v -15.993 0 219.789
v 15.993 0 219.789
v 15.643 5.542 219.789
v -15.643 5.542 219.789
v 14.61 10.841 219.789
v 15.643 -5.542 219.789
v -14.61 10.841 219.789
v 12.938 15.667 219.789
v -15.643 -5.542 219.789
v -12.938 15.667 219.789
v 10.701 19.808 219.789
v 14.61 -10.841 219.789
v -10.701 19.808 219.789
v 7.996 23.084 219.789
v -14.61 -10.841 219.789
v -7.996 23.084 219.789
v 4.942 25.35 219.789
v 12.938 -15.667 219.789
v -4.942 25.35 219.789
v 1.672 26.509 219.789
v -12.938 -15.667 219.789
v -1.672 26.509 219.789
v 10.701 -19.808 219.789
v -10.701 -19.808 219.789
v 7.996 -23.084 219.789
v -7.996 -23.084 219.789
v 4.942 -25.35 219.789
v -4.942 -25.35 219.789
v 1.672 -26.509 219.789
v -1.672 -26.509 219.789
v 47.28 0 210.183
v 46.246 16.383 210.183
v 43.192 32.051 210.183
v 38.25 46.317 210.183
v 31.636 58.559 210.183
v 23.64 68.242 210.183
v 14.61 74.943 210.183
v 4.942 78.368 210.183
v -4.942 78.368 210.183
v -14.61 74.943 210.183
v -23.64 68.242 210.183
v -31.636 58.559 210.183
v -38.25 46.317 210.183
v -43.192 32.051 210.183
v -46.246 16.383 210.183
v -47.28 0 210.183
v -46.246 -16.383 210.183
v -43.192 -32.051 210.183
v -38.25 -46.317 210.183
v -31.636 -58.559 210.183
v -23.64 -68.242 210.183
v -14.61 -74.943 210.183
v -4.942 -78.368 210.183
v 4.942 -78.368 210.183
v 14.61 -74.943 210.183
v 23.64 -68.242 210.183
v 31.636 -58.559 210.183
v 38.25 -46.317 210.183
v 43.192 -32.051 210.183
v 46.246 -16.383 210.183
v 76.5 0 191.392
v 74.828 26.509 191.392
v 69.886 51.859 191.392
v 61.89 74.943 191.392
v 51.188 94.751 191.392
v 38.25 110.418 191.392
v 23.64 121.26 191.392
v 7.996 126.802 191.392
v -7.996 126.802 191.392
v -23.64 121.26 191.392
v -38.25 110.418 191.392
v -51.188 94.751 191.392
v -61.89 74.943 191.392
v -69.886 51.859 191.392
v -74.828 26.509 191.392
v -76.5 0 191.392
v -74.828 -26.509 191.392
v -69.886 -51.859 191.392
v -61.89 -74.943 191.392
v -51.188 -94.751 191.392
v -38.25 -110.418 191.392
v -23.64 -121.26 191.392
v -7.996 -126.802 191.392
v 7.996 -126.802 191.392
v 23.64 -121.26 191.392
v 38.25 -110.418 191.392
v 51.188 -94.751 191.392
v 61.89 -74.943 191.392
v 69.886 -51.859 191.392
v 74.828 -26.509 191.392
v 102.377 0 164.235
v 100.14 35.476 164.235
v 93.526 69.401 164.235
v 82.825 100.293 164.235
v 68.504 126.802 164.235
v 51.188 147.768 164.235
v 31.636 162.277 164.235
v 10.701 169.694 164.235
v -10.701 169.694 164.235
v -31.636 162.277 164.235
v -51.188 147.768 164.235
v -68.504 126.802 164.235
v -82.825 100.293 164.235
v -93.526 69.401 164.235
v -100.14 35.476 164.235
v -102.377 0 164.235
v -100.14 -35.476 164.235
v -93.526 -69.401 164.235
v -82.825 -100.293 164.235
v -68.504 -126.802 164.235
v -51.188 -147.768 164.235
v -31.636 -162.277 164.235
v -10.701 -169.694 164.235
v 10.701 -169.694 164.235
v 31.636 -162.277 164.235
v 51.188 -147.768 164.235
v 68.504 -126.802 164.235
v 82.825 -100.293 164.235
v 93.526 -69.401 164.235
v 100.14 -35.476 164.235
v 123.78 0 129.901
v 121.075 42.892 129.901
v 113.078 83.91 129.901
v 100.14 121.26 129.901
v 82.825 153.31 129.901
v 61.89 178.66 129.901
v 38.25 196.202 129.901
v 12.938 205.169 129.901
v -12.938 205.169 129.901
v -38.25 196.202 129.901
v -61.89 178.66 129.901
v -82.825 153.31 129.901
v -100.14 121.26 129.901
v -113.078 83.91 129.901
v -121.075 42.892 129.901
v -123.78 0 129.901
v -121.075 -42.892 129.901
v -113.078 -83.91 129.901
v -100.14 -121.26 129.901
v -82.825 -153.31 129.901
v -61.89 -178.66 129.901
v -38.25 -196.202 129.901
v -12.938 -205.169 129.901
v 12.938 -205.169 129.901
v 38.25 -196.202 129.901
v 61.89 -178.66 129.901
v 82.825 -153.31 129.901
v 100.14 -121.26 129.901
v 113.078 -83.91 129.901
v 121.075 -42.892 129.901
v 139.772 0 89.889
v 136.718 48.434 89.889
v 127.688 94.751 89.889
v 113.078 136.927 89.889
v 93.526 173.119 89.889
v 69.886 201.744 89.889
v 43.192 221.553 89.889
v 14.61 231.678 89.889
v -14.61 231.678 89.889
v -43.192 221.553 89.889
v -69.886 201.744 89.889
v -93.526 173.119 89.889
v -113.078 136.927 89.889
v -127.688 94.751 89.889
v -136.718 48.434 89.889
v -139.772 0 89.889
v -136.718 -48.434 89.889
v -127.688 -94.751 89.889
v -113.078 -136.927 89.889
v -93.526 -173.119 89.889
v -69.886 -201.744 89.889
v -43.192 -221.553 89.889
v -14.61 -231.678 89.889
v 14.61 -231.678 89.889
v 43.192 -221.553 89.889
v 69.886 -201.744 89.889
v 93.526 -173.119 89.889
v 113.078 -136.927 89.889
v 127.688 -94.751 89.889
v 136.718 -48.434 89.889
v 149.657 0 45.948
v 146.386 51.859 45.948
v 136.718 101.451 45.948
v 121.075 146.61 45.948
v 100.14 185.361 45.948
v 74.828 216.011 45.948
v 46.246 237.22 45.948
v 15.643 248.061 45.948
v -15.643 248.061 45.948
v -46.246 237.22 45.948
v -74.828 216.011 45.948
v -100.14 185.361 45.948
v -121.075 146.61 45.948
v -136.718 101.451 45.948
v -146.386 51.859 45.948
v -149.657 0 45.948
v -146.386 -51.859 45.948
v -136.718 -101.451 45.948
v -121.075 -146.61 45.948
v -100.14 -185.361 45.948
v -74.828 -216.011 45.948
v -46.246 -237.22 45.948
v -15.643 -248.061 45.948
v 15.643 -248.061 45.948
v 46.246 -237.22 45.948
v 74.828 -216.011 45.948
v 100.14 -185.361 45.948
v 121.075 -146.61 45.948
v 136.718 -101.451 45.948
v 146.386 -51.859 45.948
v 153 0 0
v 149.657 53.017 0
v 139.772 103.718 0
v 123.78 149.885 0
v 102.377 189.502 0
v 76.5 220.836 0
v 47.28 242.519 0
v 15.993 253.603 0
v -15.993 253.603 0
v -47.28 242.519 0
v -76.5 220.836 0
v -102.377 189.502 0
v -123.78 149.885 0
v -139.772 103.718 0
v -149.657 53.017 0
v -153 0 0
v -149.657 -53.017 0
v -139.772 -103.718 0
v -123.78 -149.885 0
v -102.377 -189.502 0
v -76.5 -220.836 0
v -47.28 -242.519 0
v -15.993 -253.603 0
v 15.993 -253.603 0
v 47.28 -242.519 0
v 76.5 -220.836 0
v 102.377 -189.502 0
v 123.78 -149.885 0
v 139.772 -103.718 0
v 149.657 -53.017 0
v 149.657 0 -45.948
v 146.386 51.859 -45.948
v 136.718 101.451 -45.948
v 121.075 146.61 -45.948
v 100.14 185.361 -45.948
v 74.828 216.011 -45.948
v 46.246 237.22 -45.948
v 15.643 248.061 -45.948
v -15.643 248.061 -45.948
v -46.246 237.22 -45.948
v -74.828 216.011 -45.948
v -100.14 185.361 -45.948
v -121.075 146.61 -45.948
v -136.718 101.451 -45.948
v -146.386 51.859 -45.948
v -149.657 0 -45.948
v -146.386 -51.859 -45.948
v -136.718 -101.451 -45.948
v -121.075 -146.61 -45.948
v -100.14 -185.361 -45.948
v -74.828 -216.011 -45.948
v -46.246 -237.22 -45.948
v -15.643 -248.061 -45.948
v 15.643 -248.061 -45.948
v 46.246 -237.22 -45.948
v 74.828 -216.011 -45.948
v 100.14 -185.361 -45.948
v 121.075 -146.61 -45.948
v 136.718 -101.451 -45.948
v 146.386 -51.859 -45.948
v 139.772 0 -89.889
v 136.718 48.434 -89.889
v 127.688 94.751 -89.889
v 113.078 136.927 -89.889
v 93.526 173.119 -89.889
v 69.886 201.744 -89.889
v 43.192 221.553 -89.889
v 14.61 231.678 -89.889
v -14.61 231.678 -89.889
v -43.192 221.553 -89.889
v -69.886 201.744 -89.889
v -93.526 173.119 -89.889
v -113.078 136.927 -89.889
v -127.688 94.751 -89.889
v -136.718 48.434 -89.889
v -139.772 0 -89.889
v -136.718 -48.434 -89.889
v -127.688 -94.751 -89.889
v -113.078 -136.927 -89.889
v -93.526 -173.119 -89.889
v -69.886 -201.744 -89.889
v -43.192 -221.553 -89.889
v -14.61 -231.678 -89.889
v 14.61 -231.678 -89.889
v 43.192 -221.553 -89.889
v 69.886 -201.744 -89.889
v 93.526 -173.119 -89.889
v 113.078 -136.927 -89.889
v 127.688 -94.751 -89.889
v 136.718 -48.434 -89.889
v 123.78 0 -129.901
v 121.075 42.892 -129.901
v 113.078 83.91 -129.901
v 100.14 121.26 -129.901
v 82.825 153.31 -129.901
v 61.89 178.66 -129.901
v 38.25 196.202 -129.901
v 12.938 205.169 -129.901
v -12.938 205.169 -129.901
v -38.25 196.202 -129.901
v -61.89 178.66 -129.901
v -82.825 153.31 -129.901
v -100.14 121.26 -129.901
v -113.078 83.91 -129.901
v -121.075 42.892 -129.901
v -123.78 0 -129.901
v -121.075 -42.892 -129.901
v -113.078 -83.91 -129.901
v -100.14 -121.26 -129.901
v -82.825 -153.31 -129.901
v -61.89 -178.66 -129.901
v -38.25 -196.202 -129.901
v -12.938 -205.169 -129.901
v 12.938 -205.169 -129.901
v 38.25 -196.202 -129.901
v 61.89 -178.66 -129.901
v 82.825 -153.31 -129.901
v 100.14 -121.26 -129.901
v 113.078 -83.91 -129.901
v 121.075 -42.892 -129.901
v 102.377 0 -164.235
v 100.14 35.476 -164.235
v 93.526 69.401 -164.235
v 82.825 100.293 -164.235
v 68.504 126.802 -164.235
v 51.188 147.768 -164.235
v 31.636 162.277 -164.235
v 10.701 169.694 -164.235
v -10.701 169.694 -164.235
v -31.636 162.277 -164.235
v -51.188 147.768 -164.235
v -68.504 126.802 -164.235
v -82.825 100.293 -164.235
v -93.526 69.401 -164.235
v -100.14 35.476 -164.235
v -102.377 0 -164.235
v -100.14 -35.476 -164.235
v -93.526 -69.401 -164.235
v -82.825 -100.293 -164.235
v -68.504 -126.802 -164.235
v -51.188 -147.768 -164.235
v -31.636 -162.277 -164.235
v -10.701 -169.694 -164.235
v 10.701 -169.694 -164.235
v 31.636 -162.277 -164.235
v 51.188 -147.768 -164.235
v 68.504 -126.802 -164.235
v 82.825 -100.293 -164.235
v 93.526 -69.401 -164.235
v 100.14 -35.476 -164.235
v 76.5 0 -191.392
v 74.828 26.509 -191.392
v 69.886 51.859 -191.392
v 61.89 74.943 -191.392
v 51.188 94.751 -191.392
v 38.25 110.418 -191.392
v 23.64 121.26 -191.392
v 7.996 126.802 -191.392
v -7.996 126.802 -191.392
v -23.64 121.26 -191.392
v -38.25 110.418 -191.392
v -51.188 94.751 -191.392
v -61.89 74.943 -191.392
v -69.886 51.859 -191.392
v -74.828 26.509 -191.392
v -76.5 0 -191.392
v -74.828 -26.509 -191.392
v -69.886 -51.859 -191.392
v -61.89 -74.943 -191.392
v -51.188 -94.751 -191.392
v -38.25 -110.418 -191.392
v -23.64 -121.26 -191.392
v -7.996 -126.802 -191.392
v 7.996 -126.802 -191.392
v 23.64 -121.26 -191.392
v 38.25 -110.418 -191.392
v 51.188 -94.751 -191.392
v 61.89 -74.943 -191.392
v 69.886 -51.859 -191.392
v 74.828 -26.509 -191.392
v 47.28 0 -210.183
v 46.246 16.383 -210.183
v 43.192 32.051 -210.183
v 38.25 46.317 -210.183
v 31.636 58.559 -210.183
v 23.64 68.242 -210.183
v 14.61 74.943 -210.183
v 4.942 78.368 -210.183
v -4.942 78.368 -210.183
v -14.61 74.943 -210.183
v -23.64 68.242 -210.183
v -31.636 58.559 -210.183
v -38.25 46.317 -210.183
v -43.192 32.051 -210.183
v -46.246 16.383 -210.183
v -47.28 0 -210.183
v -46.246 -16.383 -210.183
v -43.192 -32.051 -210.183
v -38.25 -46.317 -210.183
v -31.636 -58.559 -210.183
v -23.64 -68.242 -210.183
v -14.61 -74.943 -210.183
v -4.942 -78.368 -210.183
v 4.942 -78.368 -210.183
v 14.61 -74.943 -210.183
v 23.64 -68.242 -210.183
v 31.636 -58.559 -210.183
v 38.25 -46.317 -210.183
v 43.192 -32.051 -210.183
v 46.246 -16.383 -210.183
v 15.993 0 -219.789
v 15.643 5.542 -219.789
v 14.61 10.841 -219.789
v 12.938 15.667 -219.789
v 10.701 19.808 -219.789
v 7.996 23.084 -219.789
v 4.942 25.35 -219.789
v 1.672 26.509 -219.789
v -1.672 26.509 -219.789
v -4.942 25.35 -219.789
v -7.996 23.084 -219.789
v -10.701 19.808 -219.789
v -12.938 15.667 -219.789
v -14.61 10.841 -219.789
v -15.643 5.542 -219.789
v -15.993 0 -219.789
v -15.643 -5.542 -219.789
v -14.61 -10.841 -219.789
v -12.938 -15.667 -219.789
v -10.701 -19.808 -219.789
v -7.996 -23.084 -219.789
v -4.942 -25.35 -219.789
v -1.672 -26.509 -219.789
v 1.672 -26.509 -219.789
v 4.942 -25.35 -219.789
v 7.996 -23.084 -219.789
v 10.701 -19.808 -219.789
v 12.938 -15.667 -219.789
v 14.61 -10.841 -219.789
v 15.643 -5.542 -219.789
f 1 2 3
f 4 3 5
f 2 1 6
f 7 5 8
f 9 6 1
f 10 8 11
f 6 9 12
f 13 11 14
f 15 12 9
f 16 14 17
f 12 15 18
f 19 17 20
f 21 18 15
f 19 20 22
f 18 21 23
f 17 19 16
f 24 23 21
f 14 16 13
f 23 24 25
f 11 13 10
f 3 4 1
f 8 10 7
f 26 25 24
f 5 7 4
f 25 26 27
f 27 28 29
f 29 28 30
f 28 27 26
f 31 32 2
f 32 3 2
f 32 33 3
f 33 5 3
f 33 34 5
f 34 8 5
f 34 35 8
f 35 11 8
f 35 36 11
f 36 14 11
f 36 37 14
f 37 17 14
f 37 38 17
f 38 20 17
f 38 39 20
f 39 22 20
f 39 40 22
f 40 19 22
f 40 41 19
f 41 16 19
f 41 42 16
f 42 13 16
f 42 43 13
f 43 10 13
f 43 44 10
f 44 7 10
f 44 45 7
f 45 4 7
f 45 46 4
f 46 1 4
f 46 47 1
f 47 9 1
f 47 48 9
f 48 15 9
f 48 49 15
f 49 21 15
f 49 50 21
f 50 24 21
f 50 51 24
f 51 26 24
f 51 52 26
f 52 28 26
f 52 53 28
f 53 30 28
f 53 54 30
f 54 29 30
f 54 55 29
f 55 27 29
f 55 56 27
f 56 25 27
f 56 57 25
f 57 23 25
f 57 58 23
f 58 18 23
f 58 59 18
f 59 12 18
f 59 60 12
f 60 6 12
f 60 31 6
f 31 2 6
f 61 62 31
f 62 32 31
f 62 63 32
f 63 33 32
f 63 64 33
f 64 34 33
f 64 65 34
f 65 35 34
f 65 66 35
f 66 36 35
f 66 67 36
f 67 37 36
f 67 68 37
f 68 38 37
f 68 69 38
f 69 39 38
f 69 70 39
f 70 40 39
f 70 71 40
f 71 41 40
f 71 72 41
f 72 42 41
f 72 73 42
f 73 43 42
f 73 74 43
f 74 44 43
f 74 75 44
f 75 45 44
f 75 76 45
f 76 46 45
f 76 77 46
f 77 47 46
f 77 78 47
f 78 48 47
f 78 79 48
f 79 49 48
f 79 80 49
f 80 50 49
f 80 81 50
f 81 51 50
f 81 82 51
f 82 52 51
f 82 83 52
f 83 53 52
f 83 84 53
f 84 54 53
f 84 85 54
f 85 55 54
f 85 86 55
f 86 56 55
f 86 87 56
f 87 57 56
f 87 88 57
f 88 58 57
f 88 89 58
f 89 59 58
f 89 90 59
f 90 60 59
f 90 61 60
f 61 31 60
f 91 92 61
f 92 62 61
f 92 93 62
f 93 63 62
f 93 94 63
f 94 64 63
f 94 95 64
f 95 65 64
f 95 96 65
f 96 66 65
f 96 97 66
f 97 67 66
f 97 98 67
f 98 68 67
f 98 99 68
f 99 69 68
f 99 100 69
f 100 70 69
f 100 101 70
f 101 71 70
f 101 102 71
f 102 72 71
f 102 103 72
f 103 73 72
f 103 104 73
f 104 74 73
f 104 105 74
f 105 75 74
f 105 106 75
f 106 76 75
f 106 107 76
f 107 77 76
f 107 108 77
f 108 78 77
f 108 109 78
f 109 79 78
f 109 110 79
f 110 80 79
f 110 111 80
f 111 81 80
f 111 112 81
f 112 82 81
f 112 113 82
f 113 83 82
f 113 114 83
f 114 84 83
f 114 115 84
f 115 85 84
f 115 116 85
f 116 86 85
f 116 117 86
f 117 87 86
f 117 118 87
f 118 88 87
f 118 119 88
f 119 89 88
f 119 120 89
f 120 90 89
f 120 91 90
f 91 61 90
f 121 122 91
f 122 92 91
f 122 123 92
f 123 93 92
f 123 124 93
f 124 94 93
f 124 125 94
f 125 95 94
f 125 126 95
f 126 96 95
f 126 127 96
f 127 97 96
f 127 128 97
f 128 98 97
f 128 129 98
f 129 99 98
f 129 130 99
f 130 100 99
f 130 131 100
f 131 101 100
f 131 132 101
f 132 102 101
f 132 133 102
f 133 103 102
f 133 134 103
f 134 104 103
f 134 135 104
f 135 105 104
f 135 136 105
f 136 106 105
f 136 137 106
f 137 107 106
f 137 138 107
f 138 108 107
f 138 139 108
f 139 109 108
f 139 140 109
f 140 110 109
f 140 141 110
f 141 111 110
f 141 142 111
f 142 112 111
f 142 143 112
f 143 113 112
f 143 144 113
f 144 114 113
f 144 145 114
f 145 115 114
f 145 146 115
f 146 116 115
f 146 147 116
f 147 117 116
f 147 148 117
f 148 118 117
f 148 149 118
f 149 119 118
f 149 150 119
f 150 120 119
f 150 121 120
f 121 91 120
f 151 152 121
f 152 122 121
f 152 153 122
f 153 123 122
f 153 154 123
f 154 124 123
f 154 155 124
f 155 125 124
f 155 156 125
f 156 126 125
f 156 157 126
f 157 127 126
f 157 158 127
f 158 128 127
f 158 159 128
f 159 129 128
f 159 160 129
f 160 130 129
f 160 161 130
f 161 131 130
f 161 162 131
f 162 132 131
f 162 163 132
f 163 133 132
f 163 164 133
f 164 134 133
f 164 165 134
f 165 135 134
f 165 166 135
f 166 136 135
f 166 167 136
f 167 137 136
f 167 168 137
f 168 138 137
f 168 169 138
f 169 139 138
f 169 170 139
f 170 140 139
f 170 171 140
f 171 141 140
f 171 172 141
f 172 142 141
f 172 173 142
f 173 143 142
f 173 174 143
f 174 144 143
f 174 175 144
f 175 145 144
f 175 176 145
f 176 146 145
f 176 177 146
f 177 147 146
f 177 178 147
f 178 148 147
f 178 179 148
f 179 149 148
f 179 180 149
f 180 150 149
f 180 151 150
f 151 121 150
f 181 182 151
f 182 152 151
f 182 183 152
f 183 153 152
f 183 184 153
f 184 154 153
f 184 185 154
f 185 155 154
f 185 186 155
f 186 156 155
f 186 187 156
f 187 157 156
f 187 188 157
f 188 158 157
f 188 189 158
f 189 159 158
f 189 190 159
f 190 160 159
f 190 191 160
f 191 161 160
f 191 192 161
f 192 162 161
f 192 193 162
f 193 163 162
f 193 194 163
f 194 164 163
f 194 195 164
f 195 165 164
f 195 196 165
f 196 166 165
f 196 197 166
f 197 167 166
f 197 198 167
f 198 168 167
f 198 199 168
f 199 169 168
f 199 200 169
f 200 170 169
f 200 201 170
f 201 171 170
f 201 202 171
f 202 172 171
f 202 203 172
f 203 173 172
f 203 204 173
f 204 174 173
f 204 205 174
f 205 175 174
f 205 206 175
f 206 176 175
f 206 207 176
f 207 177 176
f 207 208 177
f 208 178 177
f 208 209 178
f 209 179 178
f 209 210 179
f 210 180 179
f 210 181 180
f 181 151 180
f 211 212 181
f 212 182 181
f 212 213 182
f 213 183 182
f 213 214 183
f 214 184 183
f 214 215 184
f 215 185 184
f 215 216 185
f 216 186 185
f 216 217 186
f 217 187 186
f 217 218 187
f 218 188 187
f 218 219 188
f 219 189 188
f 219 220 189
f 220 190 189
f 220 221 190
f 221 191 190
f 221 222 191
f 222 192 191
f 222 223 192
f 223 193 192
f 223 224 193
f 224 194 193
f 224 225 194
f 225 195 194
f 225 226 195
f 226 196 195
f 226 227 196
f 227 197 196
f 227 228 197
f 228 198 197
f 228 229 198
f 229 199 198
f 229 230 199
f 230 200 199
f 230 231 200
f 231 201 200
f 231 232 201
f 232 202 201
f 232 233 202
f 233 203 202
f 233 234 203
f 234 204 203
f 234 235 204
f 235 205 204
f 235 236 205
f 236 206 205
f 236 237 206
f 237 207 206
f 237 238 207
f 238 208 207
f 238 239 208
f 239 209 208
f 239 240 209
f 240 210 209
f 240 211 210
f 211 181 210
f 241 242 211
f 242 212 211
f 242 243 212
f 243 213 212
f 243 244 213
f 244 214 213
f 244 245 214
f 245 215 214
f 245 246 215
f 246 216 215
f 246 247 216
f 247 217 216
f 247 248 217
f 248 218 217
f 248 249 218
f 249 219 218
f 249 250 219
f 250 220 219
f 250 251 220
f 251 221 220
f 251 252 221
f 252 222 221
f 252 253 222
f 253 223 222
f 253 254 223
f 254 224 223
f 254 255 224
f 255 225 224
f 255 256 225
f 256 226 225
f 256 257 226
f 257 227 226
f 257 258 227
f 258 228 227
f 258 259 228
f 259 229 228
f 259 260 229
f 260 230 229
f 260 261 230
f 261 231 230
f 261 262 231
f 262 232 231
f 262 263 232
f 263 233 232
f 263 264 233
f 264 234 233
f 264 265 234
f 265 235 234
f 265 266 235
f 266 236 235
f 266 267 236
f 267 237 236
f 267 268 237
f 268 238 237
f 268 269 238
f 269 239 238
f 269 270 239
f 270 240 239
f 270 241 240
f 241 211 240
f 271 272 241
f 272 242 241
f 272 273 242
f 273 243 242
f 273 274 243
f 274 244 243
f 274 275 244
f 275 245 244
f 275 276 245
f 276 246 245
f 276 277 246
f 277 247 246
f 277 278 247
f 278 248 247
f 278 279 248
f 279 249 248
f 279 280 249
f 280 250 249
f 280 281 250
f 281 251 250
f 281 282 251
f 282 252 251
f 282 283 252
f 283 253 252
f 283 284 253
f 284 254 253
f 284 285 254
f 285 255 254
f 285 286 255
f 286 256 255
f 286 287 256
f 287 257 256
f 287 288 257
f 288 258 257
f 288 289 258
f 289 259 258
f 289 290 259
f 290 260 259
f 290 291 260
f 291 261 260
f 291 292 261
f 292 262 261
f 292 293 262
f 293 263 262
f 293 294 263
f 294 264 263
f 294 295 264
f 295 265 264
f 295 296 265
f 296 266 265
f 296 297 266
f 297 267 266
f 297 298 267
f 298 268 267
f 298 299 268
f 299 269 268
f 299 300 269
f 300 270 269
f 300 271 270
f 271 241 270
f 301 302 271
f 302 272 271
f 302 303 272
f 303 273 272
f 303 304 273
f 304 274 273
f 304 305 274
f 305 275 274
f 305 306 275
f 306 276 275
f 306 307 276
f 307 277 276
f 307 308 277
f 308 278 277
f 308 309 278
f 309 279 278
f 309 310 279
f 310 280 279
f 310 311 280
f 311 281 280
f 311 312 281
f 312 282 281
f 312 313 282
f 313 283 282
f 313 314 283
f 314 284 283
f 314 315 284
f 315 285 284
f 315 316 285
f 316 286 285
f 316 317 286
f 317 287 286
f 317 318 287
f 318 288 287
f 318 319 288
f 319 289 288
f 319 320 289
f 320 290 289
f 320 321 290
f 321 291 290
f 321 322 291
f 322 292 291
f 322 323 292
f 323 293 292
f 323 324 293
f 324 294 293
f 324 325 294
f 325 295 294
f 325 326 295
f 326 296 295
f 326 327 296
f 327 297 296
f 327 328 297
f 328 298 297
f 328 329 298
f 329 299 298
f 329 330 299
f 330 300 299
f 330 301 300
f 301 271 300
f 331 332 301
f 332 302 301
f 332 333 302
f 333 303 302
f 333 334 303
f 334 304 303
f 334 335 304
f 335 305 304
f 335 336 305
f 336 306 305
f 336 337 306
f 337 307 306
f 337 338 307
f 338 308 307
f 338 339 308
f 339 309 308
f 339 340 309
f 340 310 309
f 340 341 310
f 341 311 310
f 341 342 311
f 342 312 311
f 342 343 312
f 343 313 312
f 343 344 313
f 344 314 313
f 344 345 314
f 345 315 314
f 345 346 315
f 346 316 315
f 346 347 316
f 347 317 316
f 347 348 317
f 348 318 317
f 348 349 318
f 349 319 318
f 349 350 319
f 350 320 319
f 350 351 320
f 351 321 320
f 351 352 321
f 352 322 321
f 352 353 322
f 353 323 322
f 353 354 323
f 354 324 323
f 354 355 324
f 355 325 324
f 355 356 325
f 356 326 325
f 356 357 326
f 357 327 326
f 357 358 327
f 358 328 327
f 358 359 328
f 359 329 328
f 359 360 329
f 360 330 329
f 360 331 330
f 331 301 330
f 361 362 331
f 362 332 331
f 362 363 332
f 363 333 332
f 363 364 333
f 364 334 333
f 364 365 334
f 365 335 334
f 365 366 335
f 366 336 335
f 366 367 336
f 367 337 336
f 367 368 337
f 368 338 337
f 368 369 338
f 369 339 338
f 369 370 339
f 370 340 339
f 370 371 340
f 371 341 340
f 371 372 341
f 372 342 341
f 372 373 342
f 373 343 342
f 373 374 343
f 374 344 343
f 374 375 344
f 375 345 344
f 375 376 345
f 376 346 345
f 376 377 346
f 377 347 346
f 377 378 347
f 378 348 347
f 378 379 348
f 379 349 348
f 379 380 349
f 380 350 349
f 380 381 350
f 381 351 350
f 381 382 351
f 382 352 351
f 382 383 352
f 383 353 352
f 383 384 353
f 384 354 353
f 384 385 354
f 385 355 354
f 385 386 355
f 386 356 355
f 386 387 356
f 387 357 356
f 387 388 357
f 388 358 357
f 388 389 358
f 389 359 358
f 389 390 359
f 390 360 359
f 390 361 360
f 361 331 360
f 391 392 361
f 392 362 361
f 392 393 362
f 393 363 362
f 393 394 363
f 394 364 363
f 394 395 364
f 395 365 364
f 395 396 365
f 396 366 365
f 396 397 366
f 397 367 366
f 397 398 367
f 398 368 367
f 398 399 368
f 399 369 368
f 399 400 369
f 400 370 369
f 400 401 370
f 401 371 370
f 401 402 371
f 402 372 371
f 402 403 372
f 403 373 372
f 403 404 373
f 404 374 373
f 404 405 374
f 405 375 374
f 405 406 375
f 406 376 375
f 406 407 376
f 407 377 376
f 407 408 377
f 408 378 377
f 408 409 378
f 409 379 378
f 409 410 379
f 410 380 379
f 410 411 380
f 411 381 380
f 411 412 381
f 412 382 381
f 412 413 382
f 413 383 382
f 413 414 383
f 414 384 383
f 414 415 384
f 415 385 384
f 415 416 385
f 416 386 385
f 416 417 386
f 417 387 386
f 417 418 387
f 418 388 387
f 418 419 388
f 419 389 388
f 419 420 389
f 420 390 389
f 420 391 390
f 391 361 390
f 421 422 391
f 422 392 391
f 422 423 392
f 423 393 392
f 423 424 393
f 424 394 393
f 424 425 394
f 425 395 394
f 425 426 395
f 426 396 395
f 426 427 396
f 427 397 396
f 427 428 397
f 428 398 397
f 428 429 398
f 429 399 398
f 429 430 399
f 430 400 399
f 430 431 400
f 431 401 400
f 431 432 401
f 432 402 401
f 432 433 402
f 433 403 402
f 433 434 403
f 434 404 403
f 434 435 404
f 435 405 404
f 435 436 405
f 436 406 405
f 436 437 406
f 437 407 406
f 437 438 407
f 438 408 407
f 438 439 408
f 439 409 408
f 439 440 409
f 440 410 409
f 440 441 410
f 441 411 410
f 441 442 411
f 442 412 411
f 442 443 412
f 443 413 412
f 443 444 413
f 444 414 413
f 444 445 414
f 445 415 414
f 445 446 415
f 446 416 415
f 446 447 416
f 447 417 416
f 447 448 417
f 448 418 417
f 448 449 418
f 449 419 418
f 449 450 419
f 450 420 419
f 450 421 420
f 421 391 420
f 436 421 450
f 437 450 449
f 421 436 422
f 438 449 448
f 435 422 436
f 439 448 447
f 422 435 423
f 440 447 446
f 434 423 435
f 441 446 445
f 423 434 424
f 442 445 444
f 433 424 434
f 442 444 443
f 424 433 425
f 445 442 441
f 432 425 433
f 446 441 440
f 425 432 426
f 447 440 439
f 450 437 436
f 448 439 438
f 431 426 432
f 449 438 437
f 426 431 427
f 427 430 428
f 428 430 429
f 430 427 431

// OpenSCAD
// Generated by SolidPython 1.0.1 on 2020-07-29 00:46:49


scale(v = [9, 15, 13]) {
	sphere(r = 17);
}
/***********************************************
*********      SolidPython code:      **********
************************************************
 
# import packages: SolidPython
from solid import *
from solid.utils import *
from itertools import chain, combinations, permutations


class Resize:

    def __init__(self, scad_file):
        self.scad_file = scad_file
        #self.scad_file = import_scad(scad_file)
        # cone/cylinder param:
        self.r1 = 0
        self.r2 = 0
        self.h = 0
        # rectangular prism param:
        self.w = 0
        self.l = 0
        # ellipse param:
        self.r = 0

    # import OpenScad code (file name corresponds to shape)


    # classify shape + parameters
    def assign(self, param1, param2, param3):
        if self.scad_file == 'cone.scad':
            self.r1 = param1
            self.r2 = param2
            self.h = param3
        elif self.scad_file == 'cylinder.scad':
            self.r1 = param1
            self.r2 = param2
            self.h = param3
        elif self.scad_file == 'rectangularPrism.scad':
            self.h = param1
            self.l = param2
            self.w = param3
        else:
            self.r = param1
            self.h = param2

    # resize parameters
    def iterate(self):
        x = range(3, 20, 2)
        i = 1
        if self.scad_file == 'cone.scad':
            tempList = list(permutations(x, 2))
            for temp in tempList:
                param1 = temp[0]
                param2 = temp[1]
                filepath = 'produced_scad_files/' + 'cone' + str(param1) + '_' + str(param2) + '_' + '.scad'
                scad_render_to_file(cylinder(h=param1, r1=param2, r2=0), filepath)

        elif self.scad_file == 'cylinder.scad':
            tempList = list(permutations(x, 3))
            for temp in tempList:
                param1 = temp[0]
                param2 = temp[1]
                filepath = 'produced_scad_files/' + 'cylinder' + str(param1) + '_' + str(param2) + '_' + '.scad'
                scad_render_to_file(cylinder(h=param1, r1=param2, r2=param2), filepath)

        elif self.scad_file == 'rectangularPrism.scad':
            tempList = list(permutations(x, 3))
            for temp in tempList:
                param1 = temp[0]
                param2 = temp[1]
                param3 = temp[2]
                filepath = 'produced_scad_files/' + 'rectangularPrism' + str(param1) + '_' + str(param2) + '_' + str(
                    param3) + '.scad'
                scad_render_to_file(cube(size=(param1, param2, param3)), filepath)

        elif self.scad_file == 'ellipse.scad':
            tempList = list(permutations(x, 4))
            for temp in tempList:
                param1 = temp[0]
                param2 = temp[1]
                param3 = temp[2]
                param4 = temp[3]
                filepath = 'produced_scad_files/' + 'ellipse' + str(param1) + '_' + str(param2) + '_' + str(param3) + '_' + str(param4) + '.scad'
                scad_render_to_file(scale([param1, param2, param3])(sphere(r=param4)), filepath)

    def render_to_scadfile(self):
        scad_render_to_file(scad, 'example.scad') 
 
************************************************/
